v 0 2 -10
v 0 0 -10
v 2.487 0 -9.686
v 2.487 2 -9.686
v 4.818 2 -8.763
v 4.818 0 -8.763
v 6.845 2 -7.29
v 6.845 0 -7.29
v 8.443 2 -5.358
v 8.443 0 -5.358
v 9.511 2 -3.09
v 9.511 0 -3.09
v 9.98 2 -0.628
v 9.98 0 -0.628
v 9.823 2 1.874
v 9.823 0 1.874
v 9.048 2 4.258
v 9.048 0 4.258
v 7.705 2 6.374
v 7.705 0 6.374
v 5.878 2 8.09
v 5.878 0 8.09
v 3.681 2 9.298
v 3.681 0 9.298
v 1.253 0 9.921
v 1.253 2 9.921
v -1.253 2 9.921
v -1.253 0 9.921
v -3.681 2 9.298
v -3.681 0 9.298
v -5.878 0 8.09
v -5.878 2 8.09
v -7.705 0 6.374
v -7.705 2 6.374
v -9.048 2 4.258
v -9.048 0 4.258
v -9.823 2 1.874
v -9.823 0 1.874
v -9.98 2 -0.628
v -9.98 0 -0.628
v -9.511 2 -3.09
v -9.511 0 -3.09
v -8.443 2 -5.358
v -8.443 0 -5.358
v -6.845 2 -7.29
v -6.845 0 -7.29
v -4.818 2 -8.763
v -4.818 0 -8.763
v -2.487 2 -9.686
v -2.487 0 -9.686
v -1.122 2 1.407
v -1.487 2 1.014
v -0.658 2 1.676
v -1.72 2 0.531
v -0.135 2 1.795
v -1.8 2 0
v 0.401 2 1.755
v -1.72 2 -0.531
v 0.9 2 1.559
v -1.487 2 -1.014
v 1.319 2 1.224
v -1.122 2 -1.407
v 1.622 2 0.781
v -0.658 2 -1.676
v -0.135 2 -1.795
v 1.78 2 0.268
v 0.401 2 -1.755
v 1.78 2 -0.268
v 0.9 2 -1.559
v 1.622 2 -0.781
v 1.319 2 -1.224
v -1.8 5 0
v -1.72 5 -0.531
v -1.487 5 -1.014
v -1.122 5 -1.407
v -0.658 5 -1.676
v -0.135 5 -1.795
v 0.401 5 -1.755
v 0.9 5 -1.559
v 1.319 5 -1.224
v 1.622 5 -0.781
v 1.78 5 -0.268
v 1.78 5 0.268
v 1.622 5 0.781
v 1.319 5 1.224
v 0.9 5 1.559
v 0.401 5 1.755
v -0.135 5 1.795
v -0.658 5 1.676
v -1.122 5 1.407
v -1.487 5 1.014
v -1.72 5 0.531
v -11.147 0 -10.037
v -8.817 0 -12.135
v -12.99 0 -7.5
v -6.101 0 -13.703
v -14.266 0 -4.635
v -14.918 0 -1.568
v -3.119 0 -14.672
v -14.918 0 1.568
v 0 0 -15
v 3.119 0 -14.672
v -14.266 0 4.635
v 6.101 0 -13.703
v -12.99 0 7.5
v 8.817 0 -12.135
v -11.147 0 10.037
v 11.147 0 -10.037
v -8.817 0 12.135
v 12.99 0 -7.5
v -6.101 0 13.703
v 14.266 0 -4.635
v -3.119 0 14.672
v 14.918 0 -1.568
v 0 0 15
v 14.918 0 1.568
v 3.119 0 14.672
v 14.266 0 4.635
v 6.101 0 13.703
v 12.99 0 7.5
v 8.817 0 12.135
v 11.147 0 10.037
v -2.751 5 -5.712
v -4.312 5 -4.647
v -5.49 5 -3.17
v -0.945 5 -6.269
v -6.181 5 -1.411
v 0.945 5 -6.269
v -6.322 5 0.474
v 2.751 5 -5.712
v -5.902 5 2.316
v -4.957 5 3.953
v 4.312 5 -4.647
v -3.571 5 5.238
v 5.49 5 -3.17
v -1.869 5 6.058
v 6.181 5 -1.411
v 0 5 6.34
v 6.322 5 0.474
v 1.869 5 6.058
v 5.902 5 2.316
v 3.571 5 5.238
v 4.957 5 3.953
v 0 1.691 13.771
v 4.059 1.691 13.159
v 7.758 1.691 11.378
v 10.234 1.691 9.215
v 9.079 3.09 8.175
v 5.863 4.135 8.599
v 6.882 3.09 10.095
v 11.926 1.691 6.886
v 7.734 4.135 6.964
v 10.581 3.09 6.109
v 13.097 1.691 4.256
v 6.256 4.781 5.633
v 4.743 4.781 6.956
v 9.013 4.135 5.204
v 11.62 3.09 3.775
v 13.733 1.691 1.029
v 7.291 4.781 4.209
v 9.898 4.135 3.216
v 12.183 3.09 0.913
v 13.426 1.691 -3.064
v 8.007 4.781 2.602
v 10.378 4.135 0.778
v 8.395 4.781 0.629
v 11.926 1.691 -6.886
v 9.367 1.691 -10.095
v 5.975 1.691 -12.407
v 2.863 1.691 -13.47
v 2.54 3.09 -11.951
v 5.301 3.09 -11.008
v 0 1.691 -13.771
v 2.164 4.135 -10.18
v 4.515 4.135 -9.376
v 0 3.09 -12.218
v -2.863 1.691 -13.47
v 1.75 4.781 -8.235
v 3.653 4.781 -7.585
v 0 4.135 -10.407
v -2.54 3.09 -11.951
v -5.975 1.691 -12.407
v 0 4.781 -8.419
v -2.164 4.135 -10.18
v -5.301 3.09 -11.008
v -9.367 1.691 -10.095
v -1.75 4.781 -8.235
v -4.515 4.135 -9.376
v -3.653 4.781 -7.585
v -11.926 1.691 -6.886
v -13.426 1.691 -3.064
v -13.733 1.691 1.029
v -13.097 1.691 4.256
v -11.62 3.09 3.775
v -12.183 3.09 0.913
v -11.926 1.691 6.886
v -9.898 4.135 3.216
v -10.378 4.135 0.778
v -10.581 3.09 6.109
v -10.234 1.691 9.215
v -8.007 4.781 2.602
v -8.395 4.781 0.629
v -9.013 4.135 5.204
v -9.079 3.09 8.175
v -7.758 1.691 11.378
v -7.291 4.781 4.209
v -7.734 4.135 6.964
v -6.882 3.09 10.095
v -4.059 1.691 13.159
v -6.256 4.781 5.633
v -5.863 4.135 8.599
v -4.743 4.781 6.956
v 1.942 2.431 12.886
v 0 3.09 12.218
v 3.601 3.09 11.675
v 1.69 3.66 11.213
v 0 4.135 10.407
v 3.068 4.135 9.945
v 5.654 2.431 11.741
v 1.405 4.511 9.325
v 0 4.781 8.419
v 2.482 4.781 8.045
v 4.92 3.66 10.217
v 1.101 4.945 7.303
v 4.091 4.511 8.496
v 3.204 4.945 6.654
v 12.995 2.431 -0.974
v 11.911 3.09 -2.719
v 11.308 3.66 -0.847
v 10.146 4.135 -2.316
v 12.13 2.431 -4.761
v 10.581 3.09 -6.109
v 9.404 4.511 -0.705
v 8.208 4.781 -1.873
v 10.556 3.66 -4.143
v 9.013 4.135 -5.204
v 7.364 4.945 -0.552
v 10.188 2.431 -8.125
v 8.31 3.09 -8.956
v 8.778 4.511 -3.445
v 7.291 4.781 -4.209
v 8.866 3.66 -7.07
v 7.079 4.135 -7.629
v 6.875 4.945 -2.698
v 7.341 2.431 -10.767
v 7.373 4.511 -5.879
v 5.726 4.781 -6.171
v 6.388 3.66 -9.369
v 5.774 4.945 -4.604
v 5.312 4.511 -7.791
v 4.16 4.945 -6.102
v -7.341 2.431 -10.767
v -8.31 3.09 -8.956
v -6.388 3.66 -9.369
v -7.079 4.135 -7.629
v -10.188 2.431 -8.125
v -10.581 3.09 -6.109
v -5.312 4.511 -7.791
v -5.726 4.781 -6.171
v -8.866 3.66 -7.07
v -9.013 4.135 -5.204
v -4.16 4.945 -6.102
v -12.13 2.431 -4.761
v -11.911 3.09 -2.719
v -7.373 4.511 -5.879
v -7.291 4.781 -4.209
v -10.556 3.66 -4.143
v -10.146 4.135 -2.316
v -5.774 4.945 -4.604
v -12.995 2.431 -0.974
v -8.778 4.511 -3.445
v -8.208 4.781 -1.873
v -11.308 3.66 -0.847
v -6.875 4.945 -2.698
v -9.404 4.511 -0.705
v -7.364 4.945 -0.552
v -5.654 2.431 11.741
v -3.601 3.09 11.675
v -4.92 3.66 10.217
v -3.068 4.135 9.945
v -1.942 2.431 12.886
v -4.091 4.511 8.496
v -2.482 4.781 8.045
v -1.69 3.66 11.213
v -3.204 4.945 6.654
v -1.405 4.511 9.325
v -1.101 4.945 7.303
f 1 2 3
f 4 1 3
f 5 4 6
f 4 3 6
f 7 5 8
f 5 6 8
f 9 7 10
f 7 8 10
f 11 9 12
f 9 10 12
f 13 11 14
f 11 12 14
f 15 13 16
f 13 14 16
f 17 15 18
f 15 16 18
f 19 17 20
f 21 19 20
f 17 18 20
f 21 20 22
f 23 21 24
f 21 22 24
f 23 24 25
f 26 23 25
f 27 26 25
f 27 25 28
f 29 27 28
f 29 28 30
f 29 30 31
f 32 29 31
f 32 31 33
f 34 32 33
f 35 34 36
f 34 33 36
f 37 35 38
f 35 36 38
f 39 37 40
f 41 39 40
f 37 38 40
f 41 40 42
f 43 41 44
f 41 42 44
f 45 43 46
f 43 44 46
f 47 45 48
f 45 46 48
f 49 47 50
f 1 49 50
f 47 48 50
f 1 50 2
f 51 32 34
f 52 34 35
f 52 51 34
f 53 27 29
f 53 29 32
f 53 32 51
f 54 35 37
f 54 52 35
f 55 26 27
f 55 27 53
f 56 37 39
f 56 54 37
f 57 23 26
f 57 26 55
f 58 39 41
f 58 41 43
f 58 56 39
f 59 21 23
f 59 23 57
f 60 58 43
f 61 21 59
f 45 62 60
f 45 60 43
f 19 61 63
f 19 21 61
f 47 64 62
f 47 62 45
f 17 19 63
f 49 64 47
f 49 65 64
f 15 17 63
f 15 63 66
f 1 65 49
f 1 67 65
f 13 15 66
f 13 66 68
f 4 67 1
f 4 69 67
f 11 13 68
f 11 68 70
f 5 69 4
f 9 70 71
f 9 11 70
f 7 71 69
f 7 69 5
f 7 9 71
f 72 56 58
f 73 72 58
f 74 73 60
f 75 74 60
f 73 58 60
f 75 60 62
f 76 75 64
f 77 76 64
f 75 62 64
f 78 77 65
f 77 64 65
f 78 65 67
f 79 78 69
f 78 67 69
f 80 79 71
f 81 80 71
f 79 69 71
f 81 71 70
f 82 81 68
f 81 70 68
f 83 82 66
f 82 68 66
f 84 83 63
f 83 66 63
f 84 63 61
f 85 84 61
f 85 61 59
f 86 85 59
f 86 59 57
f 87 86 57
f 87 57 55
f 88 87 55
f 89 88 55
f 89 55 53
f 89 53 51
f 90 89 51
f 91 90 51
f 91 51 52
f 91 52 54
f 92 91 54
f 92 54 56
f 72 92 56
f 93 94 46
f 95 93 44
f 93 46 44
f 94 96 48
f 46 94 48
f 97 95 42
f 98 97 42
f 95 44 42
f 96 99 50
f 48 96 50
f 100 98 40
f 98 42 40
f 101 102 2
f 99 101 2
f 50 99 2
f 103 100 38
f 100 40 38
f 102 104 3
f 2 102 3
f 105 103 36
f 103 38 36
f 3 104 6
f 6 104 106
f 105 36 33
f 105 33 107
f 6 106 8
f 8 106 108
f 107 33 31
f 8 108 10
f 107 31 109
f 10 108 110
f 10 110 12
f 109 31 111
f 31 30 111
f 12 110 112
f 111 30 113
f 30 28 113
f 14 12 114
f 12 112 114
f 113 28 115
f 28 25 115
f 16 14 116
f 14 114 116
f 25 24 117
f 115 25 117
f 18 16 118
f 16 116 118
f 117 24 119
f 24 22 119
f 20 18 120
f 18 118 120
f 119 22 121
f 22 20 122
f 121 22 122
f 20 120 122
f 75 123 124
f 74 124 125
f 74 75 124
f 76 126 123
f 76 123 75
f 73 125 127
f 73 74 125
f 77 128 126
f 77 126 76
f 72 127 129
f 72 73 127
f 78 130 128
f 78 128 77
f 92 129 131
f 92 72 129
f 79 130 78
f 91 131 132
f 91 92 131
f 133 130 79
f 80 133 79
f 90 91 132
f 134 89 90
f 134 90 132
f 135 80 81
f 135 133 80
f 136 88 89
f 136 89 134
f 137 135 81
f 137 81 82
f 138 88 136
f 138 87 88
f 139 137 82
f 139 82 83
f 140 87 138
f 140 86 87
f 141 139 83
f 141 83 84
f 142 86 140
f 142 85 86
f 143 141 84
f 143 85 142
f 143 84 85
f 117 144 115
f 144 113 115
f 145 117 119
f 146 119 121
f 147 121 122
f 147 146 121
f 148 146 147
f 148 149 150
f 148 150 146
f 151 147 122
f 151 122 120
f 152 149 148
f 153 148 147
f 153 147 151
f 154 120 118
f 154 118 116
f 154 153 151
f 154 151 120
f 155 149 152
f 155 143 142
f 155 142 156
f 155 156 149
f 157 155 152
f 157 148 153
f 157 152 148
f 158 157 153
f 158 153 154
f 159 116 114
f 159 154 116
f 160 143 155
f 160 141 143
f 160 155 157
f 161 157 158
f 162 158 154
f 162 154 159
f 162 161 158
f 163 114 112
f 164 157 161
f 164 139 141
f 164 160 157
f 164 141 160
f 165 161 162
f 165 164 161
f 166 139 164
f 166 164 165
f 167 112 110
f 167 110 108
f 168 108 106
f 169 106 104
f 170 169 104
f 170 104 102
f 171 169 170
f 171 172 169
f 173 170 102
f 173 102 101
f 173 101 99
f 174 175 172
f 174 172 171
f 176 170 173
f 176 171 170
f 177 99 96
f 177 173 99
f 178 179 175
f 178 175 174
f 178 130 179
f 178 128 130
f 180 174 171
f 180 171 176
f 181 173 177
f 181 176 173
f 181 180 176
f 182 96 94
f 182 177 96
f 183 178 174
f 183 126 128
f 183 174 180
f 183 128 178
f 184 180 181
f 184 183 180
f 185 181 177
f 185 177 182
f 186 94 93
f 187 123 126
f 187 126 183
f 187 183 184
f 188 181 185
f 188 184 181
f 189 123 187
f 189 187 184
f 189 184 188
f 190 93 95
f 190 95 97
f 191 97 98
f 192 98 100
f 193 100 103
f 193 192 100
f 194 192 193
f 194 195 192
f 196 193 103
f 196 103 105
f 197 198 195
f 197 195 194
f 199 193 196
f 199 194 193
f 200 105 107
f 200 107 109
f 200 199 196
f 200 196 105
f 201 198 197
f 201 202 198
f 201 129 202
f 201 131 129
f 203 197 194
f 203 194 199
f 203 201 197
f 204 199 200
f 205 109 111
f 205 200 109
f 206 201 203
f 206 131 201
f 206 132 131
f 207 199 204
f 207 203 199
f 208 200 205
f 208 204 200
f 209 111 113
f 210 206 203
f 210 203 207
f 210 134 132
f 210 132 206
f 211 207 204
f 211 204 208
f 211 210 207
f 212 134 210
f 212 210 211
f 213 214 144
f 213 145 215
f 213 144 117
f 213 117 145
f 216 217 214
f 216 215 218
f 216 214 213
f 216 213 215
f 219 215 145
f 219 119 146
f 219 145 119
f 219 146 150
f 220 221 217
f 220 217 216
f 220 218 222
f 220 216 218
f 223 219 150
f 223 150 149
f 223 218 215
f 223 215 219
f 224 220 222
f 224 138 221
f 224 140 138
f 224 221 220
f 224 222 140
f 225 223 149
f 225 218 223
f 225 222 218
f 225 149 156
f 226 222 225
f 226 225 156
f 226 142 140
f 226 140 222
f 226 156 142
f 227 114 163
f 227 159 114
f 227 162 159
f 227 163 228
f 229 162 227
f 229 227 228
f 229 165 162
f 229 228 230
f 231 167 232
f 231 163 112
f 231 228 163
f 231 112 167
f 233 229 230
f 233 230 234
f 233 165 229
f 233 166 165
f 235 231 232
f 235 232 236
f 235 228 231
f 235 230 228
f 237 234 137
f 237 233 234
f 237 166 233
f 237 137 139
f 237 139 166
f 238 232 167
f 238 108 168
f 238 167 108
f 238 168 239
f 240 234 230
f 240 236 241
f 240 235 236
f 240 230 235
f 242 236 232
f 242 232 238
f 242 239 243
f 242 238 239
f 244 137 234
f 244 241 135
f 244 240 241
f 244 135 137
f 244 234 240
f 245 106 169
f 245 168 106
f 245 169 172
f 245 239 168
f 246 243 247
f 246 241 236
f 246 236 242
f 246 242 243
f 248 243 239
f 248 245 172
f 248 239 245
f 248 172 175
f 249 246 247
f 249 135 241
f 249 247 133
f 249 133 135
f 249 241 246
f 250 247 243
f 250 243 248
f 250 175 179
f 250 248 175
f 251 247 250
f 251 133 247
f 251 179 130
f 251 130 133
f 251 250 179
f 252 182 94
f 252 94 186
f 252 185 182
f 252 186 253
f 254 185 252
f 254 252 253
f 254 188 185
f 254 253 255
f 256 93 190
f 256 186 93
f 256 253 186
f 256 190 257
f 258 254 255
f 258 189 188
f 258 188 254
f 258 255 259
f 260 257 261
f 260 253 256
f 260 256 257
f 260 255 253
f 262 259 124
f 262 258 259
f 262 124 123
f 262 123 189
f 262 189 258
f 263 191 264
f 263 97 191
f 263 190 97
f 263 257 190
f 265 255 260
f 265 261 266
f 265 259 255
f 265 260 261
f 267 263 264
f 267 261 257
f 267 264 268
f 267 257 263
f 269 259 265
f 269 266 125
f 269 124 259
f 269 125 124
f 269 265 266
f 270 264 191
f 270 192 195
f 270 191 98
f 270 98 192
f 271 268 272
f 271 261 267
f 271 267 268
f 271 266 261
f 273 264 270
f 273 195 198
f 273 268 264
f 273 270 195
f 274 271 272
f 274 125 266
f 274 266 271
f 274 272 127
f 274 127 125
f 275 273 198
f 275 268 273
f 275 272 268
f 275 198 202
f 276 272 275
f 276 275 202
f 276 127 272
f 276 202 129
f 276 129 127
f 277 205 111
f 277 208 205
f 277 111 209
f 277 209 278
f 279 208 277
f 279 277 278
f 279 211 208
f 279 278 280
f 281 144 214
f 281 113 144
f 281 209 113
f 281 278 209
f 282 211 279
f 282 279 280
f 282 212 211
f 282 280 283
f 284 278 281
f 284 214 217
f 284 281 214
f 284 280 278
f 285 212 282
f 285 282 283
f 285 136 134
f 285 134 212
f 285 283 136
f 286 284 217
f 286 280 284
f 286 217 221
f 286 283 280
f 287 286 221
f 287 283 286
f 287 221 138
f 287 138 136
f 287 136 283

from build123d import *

# Parameters (mm, degrees)
SKETCH2_R            = 15
BOSS_EXTRUDE1_DEPTH  = 5
SKETCH3_R            = 10
CUT_EXTRUDE1_DEPTH   = 2
M3_CLEARANCE_HOLE1_D = 3.6
FILLET1_R            = 10


with BuildPart() as part:
    # Sketch2 → Boss-Extrude1 (new body)
    with BuildSketch(Plane(origin=(0, 0, 0), x_dir=(1, 0, 0), z_dir=(0, 1, 0))):
        with Locations(Location((0, 0, 0), (0, 0, 270))):
            Circle(SKETCH2_R)
    extrude(amount=BOSS_EXTRUDE1_DEPTH)

    # Sketch3 → Cut-Extrude1 (cut)
    with BuildSketch(Plane.XZ):
        with Locations(Location((0, 0, 0), (0, 0, 270))):
            Circle(SKETCH3_R)
    extrude(amount=-CUT_EXTRUDE1_DEPTH, mode=Mode.SUBTRACT)

    # M3 Clearance Hole1 (through all)
    with Locations(Plane(origin=(0, 5, 0), x_dir=(1, 0, 0), z_dir=(0, 1, 0))):
        with Locations((0, 0)):
            Hole(M3_CLEARANCE_HOLE1_D / 2)

    # Fillet1
    # the kernel refuses this fillet: 10 mm, written as the material it takes off along each edge
    with BuildSketch(Plane(origin=(0, 5, 0), x_dir=(0, 0, 1), z_dir=(-1, 0, 0))) as fillet1_piece_1:
        with BuildLine():
            CenterArc((6.339745962, -10), FILLET1_R, 30, 60)
            Line((6.339745962, 0), (6.339745962, 0.2))
            Line((6.339745962, 0.2), (15, 0.2))
            Line((15, 0.2), (15.2, 0))
            ThreePointArc((15.2, 0), (15.2, -2.5), (15.173205081, -4.9))
            Line((15.173205081, -4.9), (15, -5))
        make_face()
    revolve(axis=Axis((0, 5, 0), (0, 1, 0)), mode=Mode.SUBTRACT)


solid = part.part
